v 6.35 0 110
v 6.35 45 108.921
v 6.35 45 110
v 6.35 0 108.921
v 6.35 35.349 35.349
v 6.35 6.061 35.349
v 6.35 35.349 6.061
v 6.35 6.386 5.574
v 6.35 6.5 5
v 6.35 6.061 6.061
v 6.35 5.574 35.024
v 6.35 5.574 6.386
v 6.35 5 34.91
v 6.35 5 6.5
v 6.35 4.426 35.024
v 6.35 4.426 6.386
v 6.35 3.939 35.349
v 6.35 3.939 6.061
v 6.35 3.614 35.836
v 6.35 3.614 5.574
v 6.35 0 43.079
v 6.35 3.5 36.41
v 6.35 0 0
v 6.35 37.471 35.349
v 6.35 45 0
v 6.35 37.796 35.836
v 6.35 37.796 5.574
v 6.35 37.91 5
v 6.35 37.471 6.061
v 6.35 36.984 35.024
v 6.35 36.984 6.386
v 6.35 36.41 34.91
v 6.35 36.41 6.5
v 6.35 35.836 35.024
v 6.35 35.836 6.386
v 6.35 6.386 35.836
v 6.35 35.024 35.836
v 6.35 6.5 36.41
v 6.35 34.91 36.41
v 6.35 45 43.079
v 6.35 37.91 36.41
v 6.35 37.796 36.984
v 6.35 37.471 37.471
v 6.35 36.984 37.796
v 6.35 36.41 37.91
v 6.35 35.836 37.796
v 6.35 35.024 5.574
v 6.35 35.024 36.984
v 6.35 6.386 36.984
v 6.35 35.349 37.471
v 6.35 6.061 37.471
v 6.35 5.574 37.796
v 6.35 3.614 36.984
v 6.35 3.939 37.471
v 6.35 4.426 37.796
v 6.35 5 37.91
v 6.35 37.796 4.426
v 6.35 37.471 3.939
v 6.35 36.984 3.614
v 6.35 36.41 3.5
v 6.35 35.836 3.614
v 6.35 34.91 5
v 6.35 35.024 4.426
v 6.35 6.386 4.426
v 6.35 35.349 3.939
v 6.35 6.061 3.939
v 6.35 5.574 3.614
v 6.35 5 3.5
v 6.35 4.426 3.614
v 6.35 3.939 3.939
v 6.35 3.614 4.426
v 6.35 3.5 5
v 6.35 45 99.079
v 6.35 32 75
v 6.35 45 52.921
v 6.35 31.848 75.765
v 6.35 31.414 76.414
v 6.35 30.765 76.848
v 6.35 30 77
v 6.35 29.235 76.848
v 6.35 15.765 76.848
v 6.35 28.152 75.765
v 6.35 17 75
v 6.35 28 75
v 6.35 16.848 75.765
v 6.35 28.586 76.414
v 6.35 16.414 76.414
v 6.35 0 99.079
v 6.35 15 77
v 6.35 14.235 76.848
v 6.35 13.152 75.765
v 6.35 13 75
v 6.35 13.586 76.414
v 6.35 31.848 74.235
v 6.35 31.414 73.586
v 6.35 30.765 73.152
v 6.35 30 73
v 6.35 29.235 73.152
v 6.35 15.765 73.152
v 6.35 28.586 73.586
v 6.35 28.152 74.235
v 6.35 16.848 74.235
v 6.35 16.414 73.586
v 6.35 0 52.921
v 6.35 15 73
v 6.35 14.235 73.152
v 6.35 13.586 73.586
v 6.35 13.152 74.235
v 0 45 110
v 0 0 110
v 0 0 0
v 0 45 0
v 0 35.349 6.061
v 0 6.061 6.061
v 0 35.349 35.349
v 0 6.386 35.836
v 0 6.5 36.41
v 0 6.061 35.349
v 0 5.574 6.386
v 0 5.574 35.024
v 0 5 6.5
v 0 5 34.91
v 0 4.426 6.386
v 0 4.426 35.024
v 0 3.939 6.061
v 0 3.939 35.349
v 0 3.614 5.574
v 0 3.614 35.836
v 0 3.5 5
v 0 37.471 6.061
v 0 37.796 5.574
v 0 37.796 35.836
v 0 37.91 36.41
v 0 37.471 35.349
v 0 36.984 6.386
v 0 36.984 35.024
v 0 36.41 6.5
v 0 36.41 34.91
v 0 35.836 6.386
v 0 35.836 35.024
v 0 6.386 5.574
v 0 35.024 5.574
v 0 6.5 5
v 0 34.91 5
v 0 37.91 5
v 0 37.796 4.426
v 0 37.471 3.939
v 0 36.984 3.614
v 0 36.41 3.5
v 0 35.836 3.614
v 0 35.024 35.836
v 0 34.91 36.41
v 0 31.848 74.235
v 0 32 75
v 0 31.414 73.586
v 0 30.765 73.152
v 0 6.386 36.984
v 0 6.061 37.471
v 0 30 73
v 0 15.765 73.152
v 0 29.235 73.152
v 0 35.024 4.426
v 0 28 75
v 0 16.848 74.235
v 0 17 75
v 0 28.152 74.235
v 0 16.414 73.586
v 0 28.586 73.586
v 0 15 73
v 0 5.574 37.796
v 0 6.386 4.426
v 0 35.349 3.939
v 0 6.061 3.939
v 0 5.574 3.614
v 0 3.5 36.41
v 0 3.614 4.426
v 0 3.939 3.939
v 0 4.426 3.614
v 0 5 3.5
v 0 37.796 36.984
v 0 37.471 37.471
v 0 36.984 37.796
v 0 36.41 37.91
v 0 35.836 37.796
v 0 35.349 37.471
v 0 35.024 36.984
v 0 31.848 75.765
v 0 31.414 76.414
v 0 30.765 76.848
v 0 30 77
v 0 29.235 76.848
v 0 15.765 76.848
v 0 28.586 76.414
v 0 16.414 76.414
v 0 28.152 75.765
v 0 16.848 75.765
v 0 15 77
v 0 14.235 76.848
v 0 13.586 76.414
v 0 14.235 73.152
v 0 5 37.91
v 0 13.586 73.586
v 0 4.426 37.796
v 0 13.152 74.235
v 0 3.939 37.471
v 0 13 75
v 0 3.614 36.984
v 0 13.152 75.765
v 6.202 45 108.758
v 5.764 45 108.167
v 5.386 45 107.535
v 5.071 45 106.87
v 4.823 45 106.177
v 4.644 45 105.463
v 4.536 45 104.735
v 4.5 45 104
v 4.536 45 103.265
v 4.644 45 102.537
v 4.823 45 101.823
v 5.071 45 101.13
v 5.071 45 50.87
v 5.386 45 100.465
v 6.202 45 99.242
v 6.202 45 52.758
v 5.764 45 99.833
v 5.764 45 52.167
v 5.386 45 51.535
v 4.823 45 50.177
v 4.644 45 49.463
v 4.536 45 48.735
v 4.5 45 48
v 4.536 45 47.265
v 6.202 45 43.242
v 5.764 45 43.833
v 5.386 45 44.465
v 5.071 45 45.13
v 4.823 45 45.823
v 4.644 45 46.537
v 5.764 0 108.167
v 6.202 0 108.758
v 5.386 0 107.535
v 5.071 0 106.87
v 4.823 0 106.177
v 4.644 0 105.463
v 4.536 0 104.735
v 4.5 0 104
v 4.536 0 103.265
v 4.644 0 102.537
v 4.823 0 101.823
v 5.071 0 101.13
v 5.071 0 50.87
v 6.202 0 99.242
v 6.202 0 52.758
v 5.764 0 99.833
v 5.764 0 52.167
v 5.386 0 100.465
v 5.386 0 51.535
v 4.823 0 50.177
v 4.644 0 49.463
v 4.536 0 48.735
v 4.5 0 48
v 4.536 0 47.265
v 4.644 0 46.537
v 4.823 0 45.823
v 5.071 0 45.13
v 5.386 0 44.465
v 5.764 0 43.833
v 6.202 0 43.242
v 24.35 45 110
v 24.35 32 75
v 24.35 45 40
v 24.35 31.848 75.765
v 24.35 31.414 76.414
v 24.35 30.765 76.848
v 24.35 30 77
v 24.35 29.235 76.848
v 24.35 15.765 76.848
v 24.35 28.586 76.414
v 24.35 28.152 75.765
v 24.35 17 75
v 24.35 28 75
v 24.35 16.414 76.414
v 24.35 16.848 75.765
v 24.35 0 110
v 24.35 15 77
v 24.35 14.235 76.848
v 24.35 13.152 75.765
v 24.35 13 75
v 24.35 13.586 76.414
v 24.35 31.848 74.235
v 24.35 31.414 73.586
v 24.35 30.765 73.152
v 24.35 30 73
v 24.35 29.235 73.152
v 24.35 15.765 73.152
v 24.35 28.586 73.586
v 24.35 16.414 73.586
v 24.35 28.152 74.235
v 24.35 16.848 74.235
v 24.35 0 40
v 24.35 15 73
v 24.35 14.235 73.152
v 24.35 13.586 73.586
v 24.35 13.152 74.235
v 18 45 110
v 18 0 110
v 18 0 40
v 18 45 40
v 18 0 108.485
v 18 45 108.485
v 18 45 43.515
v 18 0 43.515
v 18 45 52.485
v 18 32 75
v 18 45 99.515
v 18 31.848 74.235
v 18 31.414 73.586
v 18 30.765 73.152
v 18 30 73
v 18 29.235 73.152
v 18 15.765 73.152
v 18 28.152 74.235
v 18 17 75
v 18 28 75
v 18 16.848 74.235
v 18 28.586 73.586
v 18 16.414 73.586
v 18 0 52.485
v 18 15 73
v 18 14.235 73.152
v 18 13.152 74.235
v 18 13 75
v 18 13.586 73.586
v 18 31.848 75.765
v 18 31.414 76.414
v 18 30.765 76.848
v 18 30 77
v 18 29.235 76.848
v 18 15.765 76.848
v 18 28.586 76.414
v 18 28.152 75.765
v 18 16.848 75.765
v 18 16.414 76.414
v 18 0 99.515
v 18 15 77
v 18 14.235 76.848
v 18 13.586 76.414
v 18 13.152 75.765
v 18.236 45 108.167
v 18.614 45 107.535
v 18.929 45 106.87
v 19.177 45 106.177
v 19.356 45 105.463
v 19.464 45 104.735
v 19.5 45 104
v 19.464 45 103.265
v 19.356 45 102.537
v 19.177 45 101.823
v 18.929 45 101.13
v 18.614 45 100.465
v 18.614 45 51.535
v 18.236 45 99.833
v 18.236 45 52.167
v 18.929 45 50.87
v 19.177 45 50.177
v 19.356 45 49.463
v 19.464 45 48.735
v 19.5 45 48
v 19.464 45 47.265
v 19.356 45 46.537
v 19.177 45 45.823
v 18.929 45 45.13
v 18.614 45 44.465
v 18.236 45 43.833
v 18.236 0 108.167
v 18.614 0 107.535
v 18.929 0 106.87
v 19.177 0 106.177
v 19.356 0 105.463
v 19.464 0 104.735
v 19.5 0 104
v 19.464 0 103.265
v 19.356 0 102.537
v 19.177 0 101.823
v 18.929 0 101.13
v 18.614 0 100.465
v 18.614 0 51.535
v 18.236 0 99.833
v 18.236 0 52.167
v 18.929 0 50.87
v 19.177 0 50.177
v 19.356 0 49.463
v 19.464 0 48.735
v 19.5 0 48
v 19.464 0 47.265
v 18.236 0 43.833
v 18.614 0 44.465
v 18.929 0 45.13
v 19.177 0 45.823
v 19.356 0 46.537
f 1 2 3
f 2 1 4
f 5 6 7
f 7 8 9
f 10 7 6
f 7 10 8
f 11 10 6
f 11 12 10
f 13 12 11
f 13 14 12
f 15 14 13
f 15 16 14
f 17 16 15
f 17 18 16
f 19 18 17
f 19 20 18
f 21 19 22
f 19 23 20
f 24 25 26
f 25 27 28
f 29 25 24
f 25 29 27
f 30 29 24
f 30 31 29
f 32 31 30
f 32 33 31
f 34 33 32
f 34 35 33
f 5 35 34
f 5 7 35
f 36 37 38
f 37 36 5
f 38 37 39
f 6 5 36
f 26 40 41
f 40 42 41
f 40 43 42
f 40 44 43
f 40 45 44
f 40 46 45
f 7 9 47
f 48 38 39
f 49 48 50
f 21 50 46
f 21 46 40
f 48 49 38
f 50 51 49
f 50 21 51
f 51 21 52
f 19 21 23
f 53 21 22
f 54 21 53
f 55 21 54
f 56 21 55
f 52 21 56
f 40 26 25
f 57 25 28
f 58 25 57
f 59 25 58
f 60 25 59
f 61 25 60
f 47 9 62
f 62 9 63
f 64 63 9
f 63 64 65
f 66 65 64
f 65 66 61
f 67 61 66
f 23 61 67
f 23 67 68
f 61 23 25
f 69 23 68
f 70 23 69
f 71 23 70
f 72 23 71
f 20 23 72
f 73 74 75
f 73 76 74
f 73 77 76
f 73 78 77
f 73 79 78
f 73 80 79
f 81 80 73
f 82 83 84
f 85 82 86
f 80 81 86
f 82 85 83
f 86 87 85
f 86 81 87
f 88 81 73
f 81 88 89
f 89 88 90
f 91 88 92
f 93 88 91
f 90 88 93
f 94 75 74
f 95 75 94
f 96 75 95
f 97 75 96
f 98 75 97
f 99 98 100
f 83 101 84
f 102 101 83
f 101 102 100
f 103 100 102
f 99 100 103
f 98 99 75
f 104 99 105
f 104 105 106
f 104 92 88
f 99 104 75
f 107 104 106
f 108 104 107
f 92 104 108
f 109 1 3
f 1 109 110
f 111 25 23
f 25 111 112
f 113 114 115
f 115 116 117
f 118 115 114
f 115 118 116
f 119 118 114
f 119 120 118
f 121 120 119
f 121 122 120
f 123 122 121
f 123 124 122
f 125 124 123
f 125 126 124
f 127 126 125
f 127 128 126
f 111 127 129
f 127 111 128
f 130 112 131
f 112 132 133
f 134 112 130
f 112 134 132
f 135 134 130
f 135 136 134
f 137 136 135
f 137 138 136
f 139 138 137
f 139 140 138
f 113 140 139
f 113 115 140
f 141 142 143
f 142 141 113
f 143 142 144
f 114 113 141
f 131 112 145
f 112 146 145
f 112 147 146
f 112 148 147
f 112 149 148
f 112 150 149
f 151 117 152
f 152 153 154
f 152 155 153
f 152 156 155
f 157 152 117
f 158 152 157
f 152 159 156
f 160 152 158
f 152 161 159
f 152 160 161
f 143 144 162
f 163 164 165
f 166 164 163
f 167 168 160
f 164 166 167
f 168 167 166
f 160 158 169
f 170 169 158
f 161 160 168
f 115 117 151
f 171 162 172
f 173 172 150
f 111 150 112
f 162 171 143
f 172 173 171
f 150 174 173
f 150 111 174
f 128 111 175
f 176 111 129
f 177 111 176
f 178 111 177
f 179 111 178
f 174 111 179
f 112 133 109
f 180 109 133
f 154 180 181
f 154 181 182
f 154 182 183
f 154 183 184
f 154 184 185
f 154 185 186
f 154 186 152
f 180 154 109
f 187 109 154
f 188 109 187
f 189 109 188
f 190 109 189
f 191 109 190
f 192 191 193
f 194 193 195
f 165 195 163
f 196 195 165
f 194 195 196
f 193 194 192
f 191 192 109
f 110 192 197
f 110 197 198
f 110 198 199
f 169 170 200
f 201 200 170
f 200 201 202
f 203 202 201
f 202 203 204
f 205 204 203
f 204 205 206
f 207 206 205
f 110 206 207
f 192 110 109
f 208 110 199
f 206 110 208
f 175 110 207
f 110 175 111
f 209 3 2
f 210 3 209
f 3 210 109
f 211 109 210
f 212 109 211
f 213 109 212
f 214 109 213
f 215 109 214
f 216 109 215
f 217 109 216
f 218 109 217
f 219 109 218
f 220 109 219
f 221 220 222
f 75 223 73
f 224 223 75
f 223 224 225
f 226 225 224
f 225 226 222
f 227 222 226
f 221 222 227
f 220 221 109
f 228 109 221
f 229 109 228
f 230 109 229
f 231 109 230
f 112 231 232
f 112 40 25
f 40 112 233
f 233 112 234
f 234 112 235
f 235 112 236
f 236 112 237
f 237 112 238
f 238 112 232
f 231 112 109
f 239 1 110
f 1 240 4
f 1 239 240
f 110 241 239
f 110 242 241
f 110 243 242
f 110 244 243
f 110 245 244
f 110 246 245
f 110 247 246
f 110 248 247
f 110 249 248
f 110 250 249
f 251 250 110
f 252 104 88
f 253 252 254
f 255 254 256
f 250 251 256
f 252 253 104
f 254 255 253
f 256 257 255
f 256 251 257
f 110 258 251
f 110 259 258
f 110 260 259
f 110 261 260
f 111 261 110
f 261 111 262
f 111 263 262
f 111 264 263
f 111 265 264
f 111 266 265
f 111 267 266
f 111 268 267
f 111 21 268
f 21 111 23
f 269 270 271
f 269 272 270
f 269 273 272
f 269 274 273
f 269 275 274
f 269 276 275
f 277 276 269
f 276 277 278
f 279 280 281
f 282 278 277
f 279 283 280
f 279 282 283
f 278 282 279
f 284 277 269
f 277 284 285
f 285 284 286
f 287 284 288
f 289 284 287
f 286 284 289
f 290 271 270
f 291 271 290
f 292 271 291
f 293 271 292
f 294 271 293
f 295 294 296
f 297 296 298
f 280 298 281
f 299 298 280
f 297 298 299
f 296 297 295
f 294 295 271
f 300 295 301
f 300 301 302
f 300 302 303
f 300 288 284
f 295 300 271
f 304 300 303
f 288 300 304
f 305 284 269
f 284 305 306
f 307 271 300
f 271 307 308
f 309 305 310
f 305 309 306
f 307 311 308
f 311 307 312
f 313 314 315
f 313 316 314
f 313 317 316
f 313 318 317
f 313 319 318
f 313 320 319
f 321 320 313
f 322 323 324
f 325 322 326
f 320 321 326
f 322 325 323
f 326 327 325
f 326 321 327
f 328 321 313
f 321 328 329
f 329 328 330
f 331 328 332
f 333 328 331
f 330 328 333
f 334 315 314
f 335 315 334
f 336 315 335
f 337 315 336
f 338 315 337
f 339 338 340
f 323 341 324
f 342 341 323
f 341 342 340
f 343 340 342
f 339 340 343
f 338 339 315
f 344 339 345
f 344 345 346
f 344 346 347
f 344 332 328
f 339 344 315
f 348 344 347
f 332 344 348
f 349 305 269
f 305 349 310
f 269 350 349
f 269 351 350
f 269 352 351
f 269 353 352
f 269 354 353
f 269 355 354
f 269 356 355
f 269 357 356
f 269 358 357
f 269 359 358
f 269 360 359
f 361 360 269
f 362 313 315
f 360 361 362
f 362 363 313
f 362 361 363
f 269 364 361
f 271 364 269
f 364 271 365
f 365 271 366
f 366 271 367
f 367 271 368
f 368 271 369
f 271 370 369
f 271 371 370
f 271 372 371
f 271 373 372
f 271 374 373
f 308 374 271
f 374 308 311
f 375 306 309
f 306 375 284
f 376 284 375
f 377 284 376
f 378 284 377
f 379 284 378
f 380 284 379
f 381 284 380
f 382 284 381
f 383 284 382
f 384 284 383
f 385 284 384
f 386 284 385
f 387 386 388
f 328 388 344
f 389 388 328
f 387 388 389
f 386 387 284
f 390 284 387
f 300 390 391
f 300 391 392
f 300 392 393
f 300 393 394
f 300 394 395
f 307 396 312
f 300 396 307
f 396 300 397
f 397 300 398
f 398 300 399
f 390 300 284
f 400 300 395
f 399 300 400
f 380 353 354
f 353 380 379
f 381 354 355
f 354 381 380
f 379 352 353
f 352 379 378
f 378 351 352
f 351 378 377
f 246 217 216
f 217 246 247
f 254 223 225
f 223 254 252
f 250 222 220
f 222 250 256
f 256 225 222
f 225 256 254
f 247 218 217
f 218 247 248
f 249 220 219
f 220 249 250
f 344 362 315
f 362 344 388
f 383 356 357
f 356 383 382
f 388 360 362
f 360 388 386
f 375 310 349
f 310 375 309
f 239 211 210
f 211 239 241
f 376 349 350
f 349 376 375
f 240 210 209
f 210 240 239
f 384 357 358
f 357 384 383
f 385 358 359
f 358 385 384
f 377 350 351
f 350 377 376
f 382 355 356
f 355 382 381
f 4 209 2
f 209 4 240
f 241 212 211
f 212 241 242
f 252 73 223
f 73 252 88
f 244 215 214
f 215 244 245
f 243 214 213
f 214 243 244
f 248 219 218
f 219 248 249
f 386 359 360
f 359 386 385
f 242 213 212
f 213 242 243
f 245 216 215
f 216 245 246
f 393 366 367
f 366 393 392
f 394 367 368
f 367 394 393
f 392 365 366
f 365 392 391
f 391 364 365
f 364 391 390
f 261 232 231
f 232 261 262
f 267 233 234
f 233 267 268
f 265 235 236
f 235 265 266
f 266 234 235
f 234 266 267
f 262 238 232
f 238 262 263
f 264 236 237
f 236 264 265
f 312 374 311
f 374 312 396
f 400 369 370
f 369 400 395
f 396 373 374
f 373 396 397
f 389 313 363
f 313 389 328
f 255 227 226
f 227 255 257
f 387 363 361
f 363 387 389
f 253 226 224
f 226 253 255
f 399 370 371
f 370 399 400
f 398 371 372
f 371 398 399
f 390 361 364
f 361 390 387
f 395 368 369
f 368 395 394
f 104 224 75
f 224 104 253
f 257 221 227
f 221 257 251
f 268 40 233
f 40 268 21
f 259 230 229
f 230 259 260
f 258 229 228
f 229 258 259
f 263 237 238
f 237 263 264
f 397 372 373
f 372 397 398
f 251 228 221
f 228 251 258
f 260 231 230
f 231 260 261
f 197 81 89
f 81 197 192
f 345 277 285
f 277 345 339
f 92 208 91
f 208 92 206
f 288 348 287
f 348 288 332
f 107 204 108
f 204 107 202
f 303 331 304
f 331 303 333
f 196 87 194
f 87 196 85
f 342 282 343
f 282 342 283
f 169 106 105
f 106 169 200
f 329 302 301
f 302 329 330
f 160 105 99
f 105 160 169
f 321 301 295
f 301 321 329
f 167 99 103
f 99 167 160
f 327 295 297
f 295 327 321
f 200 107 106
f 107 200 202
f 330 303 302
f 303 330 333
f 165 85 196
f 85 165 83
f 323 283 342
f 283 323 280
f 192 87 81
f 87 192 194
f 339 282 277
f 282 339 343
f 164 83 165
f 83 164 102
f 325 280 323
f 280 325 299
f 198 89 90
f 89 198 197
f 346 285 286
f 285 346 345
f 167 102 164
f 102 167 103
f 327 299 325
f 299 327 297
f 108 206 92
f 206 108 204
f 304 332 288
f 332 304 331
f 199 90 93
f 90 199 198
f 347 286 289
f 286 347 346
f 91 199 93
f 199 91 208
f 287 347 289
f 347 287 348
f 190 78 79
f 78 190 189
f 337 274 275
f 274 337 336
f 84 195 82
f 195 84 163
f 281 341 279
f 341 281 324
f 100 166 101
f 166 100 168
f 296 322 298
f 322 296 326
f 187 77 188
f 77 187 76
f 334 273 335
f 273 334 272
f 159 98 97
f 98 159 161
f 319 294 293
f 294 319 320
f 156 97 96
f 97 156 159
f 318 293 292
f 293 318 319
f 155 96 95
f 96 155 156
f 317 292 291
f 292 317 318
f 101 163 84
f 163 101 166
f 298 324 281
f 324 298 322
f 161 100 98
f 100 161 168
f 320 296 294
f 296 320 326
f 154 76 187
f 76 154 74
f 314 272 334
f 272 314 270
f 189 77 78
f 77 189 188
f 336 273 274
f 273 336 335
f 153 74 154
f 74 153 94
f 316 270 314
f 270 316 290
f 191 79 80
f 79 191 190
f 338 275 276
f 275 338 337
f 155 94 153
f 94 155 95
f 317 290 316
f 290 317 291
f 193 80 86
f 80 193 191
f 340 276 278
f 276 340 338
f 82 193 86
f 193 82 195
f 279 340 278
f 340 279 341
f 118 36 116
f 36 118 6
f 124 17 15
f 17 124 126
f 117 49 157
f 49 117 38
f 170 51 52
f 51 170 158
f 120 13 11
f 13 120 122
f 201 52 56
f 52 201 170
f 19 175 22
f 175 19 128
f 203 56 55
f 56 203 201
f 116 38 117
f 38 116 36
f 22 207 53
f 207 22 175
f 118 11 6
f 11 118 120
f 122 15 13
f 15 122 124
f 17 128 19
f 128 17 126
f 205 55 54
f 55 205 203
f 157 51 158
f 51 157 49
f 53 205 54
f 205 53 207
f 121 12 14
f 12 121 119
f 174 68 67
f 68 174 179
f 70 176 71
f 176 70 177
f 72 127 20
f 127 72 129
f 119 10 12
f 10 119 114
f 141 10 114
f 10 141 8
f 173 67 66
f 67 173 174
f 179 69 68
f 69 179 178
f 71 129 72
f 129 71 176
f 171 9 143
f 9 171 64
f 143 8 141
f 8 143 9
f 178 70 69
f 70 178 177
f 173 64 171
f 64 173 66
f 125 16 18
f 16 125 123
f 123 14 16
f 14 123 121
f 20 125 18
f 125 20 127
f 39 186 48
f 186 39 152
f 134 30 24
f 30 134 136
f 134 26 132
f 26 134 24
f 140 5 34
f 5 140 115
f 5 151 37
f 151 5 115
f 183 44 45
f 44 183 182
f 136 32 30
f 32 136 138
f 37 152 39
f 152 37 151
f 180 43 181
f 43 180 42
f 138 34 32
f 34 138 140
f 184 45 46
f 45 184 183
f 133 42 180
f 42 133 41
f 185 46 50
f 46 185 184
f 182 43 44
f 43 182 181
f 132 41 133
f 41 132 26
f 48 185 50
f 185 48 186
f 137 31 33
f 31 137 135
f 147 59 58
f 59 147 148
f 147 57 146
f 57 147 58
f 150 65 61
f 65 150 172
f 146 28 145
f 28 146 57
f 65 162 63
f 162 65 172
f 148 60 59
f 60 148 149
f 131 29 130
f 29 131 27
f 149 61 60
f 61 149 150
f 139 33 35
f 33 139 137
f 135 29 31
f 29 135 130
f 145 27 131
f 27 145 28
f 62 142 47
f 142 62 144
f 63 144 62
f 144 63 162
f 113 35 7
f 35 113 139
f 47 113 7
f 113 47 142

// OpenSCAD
$inch = 25.4;
$total_height = 110;
$back_height = 70;
$h_rail_1 = $total_height - 6;
$h_rail_2 = $h_rail_1 - 56;
$wide = 45;


module car () {
    difference() {
        union() {
            cube([$inch/4,$wide,110]);
            translate([18,0,$total_height-$back_height]) {
                cube([$inch/4,$wide,$back_height]);
            }
        }
        translate([12,46,$h_rail_1]) { // translation to position
            rotate([90,0,0]) {
                cylinder(r=7.5, h=47, $fn=64);
                
            }
        }
        translate([12,46,$h_rail_2]) { // translation to position
            rotate([90,0,0]) {
                cylinder(r=7.5, h=47, $fn=64);
                
            }
        }  
        translate([0, $wide/3, $total_height - $back_height/2]) {
            rotate([0,90,0]) {
               cylinder(r=2, h=40, $fn=16);
            }
        } 
        translate([0, $wide/3 * 2, $total_height - $back_height/2]) {
            rotate([0,90,0]) {
               cylinder(r=2, h=40, $fn=16);
            }
        }  
    }
}



module assembly() {
    union() {
        car();
        /*
        translate([-41.41, 0, 0]) {
            cube([43.41, 43.41, 43.41]);
        }
        */
    }
}

  
module final() {
    difference() {
        assembly();
        translate([-50,5, 41.41-5]) {
            rotate([0,90,0]) {
                cylinder(r=1.5, h=60, $fn=16);
            }
        }
        translate([-50,5, 5]) {
            rotate([0,90,0]) {
                cylinder(r=1.5, h=60, $fn=16);
            }
        }
        translate([-50,41.41-5, 41.41-5]) {
            rotate([0,90,0]) {
                cylinder(r=1.5, h=60, $fn=16);
            }
        }
        translate([-50, 41.41-5, 5]) {
            rotate([0,90,0]) {
                cylinder(r=1.5, h=60, $fn=16);
            }
        }        
    }
}

final();
